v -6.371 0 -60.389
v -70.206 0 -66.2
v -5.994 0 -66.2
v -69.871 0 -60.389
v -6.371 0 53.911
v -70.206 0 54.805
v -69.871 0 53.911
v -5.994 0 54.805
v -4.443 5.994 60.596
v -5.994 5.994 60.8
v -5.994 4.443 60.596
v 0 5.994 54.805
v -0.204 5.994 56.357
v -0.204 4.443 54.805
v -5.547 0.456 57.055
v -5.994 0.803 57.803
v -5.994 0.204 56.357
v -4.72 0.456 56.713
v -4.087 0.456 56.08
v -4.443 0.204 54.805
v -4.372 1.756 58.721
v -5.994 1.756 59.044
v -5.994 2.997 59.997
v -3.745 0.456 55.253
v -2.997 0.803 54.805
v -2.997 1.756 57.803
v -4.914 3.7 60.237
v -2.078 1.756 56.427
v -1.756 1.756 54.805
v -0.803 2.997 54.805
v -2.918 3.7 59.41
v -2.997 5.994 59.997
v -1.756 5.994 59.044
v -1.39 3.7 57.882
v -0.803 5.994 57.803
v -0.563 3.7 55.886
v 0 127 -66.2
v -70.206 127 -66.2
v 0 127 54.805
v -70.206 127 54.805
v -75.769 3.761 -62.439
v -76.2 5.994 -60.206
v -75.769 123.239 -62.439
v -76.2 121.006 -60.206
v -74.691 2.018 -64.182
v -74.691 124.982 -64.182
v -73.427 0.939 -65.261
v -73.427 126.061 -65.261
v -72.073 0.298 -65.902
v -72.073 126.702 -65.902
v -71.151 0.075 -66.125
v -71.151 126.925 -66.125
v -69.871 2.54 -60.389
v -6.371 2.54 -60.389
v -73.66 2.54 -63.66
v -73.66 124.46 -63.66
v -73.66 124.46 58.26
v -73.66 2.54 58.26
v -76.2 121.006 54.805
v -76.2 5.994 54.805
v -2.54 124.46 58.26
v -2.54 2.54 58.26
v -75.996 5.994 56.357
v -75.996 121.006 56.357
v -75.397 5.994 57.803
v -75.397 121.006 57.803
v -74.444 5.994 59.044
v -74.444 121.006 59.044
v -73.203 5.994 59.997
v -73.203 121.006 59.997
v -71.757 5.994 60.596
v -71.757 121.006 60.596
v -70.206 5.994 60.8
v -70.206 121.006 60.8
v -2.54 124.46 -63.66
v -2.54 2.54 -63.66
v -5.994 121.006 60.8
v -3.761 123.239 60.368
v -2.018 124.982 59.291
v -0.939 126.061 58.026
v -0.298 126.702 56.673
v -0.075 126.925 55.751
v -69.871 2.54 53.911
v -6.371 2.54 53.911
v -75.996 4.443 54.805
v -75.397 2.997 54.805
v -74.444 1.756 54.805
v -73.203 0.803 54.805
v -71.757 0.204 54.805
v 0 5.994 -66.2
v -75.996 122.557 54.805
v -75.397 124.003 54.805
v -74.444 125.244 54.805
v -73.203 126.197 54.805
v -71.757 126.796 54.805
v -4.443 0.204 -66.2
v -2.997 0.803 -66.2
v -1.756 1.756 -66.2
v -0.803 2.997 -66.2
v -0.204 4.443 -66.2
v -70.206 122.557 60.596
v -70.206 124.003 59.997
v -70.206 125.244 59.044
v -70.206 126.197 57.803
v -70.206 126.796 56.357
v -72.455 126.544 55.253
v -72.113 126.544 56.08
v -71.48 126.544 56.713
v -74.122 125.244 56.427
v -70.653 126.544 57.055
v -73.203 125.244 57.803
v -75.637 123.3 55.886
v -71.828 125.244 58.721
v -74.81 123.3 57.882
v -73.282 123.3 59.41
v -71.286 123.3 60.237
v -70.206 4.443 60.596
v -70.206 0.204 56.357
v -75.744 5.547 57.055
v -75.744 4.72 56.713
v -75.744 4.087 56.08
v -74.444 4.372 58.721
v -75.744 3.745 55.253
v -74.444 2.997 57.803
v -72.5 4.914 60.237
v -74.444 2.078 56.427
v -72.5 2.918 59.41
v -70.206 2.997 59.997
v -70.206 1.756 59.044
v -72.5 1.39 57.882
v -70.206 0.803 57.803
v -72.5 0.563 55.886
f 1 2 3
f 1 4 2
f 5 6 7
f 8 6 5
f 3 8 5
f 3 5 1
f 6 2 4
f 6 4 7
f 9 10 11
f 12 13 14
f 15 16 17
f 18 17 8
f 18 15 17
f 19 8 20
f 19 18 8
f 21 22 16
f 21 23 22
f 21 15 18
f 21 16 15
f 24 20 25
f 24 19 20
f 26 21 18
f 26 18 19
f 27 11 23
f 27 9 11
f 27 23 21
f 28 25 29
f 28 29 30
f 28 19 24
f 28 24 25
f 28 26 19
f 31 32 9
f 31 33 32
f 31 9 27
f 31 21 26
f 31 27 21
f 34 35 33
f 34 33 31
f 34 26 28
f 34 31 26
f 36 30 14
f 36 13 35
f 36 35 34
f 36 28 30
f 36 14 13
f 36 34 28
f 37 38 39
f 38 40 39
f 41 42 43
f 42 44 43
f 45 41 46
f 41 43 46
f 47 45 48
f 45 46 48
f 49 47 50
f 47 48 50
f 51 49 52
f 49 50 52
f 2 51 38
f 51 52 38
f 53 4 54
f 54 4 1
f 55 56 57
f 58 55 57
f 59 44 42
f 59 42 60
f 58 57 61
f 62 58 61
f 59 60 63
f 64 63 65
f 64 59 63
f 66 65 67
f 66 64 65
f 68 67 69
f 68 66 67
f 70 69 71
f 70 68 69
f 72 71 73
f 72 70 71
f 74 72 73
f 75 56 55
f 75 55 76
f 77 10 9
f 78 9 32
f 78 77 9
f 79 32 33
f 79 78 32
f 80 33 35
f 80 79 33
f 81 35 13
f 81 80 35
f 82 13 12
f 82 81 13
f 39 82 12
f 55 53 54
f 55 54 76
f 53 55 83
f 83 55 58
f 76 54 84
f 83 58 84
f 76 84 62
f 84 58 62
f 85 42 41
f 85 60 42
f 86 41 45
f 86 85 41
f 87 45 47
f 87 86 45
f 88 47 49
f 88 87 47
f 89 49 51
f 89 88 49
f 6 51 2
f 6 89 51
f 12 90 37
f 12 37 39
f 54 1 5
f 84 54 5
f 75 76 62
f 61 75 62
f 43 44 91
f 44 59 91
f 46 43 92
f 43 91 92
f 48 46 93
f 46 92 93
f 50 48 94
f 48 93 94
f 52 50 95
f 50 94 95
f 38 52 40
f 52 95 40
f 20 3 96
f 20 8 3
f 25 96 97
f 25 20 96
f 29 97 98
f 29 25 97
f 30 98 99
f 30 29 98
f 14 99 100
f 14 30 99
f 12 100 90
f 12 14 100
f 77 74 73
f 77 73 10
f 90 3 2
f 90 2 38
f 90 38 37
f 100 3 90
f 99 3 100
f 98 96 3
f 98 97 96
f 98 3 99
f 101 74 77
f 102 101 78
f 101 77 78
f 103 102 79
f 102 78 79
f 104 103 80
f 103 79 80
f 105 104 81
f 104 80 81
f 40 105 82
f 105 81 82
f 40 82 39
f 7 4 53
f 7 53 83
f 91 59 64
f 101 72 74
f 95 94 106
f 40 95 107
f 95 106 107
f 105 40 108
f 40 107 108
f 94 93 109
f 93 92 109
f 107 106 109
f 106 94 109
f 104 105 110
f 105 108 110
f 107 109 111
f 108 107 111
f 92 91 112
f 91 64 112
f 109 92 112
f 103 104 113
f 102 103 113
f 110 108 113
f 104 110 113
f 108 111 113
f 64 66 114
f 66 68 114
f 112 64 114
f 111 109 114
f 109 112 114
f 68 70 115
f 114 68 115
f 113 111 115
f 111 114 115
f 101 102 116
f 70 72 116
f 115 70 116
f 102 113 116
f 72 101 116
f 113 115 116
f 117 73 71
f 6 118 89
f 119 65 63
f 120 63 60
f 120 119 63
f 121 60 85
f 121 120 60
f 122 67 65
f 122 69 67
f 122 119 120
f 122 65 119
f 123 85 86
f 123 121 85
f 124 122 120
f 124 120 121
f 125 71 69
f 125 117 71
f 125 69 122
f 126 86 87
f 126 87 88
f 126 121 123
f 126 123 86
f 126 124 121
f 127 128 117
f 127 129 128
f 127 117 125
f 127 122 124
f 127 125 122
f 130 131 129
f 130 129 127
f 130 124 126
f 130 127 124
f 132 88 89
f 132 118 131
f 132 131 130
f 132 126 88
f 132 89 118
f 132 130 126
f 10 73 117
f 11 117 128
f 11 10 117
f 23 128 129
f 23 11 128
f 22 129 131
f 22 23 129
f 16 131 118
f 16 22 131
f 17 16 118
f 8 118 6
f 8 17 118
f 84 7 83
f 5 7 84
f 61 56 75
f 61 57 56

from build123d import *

# Parameters (mm, degrees)
F0_W     = 76.2
F0_H     = 127
F1_DEPTH = 127
F2_T     = -2.54
F3_W     = 63.5
F3_H     = 114.3
F4_DEPTH = 76.2
F5_R     = 5.9944


with BuildPart() as f1:
    # F0 (on Front) → F1 (new body)
    with BuildSketch(Plane.XZ):
        with Locations((-38.1, -2.7002265453)):
            Rectangle(F0_W, F0_H)
    extrude(amount=-F1_DEPTH)

    # F2 (hollow: no face is removed)
    offset(amount=F2_T, mode=Mode.SUBTRACT)

    # F3 (on face) → F4 (cut)
    with BuildSketch(Plane.XZ):
        with Locations((-38.1208891869, -3.2391424835)):
            Rectangle(F3_W, F3_H)
    extrude(amount=-F4_DEPTH, mode=Mode.SUBTRACT)

    # F5
    f5_edges = [f1.edges().sort_by_distance(p)[0] for p in [
        (0, 63.5, 60.799773),
        (-38.1, 0, 60.799773),
        (0, 0, -2.700227),
        (-76.2, 63.5, 60.799773),
        (-76.2, 63.5, -66.200227),
        (-76.2, 0, -2.700227),
        (-76.2, 127, -2.700227),
        (-38.1, 127, 60.799773),
    ]]
    fillet(f5_edges, radius=F5_R)


solid = f1.part
